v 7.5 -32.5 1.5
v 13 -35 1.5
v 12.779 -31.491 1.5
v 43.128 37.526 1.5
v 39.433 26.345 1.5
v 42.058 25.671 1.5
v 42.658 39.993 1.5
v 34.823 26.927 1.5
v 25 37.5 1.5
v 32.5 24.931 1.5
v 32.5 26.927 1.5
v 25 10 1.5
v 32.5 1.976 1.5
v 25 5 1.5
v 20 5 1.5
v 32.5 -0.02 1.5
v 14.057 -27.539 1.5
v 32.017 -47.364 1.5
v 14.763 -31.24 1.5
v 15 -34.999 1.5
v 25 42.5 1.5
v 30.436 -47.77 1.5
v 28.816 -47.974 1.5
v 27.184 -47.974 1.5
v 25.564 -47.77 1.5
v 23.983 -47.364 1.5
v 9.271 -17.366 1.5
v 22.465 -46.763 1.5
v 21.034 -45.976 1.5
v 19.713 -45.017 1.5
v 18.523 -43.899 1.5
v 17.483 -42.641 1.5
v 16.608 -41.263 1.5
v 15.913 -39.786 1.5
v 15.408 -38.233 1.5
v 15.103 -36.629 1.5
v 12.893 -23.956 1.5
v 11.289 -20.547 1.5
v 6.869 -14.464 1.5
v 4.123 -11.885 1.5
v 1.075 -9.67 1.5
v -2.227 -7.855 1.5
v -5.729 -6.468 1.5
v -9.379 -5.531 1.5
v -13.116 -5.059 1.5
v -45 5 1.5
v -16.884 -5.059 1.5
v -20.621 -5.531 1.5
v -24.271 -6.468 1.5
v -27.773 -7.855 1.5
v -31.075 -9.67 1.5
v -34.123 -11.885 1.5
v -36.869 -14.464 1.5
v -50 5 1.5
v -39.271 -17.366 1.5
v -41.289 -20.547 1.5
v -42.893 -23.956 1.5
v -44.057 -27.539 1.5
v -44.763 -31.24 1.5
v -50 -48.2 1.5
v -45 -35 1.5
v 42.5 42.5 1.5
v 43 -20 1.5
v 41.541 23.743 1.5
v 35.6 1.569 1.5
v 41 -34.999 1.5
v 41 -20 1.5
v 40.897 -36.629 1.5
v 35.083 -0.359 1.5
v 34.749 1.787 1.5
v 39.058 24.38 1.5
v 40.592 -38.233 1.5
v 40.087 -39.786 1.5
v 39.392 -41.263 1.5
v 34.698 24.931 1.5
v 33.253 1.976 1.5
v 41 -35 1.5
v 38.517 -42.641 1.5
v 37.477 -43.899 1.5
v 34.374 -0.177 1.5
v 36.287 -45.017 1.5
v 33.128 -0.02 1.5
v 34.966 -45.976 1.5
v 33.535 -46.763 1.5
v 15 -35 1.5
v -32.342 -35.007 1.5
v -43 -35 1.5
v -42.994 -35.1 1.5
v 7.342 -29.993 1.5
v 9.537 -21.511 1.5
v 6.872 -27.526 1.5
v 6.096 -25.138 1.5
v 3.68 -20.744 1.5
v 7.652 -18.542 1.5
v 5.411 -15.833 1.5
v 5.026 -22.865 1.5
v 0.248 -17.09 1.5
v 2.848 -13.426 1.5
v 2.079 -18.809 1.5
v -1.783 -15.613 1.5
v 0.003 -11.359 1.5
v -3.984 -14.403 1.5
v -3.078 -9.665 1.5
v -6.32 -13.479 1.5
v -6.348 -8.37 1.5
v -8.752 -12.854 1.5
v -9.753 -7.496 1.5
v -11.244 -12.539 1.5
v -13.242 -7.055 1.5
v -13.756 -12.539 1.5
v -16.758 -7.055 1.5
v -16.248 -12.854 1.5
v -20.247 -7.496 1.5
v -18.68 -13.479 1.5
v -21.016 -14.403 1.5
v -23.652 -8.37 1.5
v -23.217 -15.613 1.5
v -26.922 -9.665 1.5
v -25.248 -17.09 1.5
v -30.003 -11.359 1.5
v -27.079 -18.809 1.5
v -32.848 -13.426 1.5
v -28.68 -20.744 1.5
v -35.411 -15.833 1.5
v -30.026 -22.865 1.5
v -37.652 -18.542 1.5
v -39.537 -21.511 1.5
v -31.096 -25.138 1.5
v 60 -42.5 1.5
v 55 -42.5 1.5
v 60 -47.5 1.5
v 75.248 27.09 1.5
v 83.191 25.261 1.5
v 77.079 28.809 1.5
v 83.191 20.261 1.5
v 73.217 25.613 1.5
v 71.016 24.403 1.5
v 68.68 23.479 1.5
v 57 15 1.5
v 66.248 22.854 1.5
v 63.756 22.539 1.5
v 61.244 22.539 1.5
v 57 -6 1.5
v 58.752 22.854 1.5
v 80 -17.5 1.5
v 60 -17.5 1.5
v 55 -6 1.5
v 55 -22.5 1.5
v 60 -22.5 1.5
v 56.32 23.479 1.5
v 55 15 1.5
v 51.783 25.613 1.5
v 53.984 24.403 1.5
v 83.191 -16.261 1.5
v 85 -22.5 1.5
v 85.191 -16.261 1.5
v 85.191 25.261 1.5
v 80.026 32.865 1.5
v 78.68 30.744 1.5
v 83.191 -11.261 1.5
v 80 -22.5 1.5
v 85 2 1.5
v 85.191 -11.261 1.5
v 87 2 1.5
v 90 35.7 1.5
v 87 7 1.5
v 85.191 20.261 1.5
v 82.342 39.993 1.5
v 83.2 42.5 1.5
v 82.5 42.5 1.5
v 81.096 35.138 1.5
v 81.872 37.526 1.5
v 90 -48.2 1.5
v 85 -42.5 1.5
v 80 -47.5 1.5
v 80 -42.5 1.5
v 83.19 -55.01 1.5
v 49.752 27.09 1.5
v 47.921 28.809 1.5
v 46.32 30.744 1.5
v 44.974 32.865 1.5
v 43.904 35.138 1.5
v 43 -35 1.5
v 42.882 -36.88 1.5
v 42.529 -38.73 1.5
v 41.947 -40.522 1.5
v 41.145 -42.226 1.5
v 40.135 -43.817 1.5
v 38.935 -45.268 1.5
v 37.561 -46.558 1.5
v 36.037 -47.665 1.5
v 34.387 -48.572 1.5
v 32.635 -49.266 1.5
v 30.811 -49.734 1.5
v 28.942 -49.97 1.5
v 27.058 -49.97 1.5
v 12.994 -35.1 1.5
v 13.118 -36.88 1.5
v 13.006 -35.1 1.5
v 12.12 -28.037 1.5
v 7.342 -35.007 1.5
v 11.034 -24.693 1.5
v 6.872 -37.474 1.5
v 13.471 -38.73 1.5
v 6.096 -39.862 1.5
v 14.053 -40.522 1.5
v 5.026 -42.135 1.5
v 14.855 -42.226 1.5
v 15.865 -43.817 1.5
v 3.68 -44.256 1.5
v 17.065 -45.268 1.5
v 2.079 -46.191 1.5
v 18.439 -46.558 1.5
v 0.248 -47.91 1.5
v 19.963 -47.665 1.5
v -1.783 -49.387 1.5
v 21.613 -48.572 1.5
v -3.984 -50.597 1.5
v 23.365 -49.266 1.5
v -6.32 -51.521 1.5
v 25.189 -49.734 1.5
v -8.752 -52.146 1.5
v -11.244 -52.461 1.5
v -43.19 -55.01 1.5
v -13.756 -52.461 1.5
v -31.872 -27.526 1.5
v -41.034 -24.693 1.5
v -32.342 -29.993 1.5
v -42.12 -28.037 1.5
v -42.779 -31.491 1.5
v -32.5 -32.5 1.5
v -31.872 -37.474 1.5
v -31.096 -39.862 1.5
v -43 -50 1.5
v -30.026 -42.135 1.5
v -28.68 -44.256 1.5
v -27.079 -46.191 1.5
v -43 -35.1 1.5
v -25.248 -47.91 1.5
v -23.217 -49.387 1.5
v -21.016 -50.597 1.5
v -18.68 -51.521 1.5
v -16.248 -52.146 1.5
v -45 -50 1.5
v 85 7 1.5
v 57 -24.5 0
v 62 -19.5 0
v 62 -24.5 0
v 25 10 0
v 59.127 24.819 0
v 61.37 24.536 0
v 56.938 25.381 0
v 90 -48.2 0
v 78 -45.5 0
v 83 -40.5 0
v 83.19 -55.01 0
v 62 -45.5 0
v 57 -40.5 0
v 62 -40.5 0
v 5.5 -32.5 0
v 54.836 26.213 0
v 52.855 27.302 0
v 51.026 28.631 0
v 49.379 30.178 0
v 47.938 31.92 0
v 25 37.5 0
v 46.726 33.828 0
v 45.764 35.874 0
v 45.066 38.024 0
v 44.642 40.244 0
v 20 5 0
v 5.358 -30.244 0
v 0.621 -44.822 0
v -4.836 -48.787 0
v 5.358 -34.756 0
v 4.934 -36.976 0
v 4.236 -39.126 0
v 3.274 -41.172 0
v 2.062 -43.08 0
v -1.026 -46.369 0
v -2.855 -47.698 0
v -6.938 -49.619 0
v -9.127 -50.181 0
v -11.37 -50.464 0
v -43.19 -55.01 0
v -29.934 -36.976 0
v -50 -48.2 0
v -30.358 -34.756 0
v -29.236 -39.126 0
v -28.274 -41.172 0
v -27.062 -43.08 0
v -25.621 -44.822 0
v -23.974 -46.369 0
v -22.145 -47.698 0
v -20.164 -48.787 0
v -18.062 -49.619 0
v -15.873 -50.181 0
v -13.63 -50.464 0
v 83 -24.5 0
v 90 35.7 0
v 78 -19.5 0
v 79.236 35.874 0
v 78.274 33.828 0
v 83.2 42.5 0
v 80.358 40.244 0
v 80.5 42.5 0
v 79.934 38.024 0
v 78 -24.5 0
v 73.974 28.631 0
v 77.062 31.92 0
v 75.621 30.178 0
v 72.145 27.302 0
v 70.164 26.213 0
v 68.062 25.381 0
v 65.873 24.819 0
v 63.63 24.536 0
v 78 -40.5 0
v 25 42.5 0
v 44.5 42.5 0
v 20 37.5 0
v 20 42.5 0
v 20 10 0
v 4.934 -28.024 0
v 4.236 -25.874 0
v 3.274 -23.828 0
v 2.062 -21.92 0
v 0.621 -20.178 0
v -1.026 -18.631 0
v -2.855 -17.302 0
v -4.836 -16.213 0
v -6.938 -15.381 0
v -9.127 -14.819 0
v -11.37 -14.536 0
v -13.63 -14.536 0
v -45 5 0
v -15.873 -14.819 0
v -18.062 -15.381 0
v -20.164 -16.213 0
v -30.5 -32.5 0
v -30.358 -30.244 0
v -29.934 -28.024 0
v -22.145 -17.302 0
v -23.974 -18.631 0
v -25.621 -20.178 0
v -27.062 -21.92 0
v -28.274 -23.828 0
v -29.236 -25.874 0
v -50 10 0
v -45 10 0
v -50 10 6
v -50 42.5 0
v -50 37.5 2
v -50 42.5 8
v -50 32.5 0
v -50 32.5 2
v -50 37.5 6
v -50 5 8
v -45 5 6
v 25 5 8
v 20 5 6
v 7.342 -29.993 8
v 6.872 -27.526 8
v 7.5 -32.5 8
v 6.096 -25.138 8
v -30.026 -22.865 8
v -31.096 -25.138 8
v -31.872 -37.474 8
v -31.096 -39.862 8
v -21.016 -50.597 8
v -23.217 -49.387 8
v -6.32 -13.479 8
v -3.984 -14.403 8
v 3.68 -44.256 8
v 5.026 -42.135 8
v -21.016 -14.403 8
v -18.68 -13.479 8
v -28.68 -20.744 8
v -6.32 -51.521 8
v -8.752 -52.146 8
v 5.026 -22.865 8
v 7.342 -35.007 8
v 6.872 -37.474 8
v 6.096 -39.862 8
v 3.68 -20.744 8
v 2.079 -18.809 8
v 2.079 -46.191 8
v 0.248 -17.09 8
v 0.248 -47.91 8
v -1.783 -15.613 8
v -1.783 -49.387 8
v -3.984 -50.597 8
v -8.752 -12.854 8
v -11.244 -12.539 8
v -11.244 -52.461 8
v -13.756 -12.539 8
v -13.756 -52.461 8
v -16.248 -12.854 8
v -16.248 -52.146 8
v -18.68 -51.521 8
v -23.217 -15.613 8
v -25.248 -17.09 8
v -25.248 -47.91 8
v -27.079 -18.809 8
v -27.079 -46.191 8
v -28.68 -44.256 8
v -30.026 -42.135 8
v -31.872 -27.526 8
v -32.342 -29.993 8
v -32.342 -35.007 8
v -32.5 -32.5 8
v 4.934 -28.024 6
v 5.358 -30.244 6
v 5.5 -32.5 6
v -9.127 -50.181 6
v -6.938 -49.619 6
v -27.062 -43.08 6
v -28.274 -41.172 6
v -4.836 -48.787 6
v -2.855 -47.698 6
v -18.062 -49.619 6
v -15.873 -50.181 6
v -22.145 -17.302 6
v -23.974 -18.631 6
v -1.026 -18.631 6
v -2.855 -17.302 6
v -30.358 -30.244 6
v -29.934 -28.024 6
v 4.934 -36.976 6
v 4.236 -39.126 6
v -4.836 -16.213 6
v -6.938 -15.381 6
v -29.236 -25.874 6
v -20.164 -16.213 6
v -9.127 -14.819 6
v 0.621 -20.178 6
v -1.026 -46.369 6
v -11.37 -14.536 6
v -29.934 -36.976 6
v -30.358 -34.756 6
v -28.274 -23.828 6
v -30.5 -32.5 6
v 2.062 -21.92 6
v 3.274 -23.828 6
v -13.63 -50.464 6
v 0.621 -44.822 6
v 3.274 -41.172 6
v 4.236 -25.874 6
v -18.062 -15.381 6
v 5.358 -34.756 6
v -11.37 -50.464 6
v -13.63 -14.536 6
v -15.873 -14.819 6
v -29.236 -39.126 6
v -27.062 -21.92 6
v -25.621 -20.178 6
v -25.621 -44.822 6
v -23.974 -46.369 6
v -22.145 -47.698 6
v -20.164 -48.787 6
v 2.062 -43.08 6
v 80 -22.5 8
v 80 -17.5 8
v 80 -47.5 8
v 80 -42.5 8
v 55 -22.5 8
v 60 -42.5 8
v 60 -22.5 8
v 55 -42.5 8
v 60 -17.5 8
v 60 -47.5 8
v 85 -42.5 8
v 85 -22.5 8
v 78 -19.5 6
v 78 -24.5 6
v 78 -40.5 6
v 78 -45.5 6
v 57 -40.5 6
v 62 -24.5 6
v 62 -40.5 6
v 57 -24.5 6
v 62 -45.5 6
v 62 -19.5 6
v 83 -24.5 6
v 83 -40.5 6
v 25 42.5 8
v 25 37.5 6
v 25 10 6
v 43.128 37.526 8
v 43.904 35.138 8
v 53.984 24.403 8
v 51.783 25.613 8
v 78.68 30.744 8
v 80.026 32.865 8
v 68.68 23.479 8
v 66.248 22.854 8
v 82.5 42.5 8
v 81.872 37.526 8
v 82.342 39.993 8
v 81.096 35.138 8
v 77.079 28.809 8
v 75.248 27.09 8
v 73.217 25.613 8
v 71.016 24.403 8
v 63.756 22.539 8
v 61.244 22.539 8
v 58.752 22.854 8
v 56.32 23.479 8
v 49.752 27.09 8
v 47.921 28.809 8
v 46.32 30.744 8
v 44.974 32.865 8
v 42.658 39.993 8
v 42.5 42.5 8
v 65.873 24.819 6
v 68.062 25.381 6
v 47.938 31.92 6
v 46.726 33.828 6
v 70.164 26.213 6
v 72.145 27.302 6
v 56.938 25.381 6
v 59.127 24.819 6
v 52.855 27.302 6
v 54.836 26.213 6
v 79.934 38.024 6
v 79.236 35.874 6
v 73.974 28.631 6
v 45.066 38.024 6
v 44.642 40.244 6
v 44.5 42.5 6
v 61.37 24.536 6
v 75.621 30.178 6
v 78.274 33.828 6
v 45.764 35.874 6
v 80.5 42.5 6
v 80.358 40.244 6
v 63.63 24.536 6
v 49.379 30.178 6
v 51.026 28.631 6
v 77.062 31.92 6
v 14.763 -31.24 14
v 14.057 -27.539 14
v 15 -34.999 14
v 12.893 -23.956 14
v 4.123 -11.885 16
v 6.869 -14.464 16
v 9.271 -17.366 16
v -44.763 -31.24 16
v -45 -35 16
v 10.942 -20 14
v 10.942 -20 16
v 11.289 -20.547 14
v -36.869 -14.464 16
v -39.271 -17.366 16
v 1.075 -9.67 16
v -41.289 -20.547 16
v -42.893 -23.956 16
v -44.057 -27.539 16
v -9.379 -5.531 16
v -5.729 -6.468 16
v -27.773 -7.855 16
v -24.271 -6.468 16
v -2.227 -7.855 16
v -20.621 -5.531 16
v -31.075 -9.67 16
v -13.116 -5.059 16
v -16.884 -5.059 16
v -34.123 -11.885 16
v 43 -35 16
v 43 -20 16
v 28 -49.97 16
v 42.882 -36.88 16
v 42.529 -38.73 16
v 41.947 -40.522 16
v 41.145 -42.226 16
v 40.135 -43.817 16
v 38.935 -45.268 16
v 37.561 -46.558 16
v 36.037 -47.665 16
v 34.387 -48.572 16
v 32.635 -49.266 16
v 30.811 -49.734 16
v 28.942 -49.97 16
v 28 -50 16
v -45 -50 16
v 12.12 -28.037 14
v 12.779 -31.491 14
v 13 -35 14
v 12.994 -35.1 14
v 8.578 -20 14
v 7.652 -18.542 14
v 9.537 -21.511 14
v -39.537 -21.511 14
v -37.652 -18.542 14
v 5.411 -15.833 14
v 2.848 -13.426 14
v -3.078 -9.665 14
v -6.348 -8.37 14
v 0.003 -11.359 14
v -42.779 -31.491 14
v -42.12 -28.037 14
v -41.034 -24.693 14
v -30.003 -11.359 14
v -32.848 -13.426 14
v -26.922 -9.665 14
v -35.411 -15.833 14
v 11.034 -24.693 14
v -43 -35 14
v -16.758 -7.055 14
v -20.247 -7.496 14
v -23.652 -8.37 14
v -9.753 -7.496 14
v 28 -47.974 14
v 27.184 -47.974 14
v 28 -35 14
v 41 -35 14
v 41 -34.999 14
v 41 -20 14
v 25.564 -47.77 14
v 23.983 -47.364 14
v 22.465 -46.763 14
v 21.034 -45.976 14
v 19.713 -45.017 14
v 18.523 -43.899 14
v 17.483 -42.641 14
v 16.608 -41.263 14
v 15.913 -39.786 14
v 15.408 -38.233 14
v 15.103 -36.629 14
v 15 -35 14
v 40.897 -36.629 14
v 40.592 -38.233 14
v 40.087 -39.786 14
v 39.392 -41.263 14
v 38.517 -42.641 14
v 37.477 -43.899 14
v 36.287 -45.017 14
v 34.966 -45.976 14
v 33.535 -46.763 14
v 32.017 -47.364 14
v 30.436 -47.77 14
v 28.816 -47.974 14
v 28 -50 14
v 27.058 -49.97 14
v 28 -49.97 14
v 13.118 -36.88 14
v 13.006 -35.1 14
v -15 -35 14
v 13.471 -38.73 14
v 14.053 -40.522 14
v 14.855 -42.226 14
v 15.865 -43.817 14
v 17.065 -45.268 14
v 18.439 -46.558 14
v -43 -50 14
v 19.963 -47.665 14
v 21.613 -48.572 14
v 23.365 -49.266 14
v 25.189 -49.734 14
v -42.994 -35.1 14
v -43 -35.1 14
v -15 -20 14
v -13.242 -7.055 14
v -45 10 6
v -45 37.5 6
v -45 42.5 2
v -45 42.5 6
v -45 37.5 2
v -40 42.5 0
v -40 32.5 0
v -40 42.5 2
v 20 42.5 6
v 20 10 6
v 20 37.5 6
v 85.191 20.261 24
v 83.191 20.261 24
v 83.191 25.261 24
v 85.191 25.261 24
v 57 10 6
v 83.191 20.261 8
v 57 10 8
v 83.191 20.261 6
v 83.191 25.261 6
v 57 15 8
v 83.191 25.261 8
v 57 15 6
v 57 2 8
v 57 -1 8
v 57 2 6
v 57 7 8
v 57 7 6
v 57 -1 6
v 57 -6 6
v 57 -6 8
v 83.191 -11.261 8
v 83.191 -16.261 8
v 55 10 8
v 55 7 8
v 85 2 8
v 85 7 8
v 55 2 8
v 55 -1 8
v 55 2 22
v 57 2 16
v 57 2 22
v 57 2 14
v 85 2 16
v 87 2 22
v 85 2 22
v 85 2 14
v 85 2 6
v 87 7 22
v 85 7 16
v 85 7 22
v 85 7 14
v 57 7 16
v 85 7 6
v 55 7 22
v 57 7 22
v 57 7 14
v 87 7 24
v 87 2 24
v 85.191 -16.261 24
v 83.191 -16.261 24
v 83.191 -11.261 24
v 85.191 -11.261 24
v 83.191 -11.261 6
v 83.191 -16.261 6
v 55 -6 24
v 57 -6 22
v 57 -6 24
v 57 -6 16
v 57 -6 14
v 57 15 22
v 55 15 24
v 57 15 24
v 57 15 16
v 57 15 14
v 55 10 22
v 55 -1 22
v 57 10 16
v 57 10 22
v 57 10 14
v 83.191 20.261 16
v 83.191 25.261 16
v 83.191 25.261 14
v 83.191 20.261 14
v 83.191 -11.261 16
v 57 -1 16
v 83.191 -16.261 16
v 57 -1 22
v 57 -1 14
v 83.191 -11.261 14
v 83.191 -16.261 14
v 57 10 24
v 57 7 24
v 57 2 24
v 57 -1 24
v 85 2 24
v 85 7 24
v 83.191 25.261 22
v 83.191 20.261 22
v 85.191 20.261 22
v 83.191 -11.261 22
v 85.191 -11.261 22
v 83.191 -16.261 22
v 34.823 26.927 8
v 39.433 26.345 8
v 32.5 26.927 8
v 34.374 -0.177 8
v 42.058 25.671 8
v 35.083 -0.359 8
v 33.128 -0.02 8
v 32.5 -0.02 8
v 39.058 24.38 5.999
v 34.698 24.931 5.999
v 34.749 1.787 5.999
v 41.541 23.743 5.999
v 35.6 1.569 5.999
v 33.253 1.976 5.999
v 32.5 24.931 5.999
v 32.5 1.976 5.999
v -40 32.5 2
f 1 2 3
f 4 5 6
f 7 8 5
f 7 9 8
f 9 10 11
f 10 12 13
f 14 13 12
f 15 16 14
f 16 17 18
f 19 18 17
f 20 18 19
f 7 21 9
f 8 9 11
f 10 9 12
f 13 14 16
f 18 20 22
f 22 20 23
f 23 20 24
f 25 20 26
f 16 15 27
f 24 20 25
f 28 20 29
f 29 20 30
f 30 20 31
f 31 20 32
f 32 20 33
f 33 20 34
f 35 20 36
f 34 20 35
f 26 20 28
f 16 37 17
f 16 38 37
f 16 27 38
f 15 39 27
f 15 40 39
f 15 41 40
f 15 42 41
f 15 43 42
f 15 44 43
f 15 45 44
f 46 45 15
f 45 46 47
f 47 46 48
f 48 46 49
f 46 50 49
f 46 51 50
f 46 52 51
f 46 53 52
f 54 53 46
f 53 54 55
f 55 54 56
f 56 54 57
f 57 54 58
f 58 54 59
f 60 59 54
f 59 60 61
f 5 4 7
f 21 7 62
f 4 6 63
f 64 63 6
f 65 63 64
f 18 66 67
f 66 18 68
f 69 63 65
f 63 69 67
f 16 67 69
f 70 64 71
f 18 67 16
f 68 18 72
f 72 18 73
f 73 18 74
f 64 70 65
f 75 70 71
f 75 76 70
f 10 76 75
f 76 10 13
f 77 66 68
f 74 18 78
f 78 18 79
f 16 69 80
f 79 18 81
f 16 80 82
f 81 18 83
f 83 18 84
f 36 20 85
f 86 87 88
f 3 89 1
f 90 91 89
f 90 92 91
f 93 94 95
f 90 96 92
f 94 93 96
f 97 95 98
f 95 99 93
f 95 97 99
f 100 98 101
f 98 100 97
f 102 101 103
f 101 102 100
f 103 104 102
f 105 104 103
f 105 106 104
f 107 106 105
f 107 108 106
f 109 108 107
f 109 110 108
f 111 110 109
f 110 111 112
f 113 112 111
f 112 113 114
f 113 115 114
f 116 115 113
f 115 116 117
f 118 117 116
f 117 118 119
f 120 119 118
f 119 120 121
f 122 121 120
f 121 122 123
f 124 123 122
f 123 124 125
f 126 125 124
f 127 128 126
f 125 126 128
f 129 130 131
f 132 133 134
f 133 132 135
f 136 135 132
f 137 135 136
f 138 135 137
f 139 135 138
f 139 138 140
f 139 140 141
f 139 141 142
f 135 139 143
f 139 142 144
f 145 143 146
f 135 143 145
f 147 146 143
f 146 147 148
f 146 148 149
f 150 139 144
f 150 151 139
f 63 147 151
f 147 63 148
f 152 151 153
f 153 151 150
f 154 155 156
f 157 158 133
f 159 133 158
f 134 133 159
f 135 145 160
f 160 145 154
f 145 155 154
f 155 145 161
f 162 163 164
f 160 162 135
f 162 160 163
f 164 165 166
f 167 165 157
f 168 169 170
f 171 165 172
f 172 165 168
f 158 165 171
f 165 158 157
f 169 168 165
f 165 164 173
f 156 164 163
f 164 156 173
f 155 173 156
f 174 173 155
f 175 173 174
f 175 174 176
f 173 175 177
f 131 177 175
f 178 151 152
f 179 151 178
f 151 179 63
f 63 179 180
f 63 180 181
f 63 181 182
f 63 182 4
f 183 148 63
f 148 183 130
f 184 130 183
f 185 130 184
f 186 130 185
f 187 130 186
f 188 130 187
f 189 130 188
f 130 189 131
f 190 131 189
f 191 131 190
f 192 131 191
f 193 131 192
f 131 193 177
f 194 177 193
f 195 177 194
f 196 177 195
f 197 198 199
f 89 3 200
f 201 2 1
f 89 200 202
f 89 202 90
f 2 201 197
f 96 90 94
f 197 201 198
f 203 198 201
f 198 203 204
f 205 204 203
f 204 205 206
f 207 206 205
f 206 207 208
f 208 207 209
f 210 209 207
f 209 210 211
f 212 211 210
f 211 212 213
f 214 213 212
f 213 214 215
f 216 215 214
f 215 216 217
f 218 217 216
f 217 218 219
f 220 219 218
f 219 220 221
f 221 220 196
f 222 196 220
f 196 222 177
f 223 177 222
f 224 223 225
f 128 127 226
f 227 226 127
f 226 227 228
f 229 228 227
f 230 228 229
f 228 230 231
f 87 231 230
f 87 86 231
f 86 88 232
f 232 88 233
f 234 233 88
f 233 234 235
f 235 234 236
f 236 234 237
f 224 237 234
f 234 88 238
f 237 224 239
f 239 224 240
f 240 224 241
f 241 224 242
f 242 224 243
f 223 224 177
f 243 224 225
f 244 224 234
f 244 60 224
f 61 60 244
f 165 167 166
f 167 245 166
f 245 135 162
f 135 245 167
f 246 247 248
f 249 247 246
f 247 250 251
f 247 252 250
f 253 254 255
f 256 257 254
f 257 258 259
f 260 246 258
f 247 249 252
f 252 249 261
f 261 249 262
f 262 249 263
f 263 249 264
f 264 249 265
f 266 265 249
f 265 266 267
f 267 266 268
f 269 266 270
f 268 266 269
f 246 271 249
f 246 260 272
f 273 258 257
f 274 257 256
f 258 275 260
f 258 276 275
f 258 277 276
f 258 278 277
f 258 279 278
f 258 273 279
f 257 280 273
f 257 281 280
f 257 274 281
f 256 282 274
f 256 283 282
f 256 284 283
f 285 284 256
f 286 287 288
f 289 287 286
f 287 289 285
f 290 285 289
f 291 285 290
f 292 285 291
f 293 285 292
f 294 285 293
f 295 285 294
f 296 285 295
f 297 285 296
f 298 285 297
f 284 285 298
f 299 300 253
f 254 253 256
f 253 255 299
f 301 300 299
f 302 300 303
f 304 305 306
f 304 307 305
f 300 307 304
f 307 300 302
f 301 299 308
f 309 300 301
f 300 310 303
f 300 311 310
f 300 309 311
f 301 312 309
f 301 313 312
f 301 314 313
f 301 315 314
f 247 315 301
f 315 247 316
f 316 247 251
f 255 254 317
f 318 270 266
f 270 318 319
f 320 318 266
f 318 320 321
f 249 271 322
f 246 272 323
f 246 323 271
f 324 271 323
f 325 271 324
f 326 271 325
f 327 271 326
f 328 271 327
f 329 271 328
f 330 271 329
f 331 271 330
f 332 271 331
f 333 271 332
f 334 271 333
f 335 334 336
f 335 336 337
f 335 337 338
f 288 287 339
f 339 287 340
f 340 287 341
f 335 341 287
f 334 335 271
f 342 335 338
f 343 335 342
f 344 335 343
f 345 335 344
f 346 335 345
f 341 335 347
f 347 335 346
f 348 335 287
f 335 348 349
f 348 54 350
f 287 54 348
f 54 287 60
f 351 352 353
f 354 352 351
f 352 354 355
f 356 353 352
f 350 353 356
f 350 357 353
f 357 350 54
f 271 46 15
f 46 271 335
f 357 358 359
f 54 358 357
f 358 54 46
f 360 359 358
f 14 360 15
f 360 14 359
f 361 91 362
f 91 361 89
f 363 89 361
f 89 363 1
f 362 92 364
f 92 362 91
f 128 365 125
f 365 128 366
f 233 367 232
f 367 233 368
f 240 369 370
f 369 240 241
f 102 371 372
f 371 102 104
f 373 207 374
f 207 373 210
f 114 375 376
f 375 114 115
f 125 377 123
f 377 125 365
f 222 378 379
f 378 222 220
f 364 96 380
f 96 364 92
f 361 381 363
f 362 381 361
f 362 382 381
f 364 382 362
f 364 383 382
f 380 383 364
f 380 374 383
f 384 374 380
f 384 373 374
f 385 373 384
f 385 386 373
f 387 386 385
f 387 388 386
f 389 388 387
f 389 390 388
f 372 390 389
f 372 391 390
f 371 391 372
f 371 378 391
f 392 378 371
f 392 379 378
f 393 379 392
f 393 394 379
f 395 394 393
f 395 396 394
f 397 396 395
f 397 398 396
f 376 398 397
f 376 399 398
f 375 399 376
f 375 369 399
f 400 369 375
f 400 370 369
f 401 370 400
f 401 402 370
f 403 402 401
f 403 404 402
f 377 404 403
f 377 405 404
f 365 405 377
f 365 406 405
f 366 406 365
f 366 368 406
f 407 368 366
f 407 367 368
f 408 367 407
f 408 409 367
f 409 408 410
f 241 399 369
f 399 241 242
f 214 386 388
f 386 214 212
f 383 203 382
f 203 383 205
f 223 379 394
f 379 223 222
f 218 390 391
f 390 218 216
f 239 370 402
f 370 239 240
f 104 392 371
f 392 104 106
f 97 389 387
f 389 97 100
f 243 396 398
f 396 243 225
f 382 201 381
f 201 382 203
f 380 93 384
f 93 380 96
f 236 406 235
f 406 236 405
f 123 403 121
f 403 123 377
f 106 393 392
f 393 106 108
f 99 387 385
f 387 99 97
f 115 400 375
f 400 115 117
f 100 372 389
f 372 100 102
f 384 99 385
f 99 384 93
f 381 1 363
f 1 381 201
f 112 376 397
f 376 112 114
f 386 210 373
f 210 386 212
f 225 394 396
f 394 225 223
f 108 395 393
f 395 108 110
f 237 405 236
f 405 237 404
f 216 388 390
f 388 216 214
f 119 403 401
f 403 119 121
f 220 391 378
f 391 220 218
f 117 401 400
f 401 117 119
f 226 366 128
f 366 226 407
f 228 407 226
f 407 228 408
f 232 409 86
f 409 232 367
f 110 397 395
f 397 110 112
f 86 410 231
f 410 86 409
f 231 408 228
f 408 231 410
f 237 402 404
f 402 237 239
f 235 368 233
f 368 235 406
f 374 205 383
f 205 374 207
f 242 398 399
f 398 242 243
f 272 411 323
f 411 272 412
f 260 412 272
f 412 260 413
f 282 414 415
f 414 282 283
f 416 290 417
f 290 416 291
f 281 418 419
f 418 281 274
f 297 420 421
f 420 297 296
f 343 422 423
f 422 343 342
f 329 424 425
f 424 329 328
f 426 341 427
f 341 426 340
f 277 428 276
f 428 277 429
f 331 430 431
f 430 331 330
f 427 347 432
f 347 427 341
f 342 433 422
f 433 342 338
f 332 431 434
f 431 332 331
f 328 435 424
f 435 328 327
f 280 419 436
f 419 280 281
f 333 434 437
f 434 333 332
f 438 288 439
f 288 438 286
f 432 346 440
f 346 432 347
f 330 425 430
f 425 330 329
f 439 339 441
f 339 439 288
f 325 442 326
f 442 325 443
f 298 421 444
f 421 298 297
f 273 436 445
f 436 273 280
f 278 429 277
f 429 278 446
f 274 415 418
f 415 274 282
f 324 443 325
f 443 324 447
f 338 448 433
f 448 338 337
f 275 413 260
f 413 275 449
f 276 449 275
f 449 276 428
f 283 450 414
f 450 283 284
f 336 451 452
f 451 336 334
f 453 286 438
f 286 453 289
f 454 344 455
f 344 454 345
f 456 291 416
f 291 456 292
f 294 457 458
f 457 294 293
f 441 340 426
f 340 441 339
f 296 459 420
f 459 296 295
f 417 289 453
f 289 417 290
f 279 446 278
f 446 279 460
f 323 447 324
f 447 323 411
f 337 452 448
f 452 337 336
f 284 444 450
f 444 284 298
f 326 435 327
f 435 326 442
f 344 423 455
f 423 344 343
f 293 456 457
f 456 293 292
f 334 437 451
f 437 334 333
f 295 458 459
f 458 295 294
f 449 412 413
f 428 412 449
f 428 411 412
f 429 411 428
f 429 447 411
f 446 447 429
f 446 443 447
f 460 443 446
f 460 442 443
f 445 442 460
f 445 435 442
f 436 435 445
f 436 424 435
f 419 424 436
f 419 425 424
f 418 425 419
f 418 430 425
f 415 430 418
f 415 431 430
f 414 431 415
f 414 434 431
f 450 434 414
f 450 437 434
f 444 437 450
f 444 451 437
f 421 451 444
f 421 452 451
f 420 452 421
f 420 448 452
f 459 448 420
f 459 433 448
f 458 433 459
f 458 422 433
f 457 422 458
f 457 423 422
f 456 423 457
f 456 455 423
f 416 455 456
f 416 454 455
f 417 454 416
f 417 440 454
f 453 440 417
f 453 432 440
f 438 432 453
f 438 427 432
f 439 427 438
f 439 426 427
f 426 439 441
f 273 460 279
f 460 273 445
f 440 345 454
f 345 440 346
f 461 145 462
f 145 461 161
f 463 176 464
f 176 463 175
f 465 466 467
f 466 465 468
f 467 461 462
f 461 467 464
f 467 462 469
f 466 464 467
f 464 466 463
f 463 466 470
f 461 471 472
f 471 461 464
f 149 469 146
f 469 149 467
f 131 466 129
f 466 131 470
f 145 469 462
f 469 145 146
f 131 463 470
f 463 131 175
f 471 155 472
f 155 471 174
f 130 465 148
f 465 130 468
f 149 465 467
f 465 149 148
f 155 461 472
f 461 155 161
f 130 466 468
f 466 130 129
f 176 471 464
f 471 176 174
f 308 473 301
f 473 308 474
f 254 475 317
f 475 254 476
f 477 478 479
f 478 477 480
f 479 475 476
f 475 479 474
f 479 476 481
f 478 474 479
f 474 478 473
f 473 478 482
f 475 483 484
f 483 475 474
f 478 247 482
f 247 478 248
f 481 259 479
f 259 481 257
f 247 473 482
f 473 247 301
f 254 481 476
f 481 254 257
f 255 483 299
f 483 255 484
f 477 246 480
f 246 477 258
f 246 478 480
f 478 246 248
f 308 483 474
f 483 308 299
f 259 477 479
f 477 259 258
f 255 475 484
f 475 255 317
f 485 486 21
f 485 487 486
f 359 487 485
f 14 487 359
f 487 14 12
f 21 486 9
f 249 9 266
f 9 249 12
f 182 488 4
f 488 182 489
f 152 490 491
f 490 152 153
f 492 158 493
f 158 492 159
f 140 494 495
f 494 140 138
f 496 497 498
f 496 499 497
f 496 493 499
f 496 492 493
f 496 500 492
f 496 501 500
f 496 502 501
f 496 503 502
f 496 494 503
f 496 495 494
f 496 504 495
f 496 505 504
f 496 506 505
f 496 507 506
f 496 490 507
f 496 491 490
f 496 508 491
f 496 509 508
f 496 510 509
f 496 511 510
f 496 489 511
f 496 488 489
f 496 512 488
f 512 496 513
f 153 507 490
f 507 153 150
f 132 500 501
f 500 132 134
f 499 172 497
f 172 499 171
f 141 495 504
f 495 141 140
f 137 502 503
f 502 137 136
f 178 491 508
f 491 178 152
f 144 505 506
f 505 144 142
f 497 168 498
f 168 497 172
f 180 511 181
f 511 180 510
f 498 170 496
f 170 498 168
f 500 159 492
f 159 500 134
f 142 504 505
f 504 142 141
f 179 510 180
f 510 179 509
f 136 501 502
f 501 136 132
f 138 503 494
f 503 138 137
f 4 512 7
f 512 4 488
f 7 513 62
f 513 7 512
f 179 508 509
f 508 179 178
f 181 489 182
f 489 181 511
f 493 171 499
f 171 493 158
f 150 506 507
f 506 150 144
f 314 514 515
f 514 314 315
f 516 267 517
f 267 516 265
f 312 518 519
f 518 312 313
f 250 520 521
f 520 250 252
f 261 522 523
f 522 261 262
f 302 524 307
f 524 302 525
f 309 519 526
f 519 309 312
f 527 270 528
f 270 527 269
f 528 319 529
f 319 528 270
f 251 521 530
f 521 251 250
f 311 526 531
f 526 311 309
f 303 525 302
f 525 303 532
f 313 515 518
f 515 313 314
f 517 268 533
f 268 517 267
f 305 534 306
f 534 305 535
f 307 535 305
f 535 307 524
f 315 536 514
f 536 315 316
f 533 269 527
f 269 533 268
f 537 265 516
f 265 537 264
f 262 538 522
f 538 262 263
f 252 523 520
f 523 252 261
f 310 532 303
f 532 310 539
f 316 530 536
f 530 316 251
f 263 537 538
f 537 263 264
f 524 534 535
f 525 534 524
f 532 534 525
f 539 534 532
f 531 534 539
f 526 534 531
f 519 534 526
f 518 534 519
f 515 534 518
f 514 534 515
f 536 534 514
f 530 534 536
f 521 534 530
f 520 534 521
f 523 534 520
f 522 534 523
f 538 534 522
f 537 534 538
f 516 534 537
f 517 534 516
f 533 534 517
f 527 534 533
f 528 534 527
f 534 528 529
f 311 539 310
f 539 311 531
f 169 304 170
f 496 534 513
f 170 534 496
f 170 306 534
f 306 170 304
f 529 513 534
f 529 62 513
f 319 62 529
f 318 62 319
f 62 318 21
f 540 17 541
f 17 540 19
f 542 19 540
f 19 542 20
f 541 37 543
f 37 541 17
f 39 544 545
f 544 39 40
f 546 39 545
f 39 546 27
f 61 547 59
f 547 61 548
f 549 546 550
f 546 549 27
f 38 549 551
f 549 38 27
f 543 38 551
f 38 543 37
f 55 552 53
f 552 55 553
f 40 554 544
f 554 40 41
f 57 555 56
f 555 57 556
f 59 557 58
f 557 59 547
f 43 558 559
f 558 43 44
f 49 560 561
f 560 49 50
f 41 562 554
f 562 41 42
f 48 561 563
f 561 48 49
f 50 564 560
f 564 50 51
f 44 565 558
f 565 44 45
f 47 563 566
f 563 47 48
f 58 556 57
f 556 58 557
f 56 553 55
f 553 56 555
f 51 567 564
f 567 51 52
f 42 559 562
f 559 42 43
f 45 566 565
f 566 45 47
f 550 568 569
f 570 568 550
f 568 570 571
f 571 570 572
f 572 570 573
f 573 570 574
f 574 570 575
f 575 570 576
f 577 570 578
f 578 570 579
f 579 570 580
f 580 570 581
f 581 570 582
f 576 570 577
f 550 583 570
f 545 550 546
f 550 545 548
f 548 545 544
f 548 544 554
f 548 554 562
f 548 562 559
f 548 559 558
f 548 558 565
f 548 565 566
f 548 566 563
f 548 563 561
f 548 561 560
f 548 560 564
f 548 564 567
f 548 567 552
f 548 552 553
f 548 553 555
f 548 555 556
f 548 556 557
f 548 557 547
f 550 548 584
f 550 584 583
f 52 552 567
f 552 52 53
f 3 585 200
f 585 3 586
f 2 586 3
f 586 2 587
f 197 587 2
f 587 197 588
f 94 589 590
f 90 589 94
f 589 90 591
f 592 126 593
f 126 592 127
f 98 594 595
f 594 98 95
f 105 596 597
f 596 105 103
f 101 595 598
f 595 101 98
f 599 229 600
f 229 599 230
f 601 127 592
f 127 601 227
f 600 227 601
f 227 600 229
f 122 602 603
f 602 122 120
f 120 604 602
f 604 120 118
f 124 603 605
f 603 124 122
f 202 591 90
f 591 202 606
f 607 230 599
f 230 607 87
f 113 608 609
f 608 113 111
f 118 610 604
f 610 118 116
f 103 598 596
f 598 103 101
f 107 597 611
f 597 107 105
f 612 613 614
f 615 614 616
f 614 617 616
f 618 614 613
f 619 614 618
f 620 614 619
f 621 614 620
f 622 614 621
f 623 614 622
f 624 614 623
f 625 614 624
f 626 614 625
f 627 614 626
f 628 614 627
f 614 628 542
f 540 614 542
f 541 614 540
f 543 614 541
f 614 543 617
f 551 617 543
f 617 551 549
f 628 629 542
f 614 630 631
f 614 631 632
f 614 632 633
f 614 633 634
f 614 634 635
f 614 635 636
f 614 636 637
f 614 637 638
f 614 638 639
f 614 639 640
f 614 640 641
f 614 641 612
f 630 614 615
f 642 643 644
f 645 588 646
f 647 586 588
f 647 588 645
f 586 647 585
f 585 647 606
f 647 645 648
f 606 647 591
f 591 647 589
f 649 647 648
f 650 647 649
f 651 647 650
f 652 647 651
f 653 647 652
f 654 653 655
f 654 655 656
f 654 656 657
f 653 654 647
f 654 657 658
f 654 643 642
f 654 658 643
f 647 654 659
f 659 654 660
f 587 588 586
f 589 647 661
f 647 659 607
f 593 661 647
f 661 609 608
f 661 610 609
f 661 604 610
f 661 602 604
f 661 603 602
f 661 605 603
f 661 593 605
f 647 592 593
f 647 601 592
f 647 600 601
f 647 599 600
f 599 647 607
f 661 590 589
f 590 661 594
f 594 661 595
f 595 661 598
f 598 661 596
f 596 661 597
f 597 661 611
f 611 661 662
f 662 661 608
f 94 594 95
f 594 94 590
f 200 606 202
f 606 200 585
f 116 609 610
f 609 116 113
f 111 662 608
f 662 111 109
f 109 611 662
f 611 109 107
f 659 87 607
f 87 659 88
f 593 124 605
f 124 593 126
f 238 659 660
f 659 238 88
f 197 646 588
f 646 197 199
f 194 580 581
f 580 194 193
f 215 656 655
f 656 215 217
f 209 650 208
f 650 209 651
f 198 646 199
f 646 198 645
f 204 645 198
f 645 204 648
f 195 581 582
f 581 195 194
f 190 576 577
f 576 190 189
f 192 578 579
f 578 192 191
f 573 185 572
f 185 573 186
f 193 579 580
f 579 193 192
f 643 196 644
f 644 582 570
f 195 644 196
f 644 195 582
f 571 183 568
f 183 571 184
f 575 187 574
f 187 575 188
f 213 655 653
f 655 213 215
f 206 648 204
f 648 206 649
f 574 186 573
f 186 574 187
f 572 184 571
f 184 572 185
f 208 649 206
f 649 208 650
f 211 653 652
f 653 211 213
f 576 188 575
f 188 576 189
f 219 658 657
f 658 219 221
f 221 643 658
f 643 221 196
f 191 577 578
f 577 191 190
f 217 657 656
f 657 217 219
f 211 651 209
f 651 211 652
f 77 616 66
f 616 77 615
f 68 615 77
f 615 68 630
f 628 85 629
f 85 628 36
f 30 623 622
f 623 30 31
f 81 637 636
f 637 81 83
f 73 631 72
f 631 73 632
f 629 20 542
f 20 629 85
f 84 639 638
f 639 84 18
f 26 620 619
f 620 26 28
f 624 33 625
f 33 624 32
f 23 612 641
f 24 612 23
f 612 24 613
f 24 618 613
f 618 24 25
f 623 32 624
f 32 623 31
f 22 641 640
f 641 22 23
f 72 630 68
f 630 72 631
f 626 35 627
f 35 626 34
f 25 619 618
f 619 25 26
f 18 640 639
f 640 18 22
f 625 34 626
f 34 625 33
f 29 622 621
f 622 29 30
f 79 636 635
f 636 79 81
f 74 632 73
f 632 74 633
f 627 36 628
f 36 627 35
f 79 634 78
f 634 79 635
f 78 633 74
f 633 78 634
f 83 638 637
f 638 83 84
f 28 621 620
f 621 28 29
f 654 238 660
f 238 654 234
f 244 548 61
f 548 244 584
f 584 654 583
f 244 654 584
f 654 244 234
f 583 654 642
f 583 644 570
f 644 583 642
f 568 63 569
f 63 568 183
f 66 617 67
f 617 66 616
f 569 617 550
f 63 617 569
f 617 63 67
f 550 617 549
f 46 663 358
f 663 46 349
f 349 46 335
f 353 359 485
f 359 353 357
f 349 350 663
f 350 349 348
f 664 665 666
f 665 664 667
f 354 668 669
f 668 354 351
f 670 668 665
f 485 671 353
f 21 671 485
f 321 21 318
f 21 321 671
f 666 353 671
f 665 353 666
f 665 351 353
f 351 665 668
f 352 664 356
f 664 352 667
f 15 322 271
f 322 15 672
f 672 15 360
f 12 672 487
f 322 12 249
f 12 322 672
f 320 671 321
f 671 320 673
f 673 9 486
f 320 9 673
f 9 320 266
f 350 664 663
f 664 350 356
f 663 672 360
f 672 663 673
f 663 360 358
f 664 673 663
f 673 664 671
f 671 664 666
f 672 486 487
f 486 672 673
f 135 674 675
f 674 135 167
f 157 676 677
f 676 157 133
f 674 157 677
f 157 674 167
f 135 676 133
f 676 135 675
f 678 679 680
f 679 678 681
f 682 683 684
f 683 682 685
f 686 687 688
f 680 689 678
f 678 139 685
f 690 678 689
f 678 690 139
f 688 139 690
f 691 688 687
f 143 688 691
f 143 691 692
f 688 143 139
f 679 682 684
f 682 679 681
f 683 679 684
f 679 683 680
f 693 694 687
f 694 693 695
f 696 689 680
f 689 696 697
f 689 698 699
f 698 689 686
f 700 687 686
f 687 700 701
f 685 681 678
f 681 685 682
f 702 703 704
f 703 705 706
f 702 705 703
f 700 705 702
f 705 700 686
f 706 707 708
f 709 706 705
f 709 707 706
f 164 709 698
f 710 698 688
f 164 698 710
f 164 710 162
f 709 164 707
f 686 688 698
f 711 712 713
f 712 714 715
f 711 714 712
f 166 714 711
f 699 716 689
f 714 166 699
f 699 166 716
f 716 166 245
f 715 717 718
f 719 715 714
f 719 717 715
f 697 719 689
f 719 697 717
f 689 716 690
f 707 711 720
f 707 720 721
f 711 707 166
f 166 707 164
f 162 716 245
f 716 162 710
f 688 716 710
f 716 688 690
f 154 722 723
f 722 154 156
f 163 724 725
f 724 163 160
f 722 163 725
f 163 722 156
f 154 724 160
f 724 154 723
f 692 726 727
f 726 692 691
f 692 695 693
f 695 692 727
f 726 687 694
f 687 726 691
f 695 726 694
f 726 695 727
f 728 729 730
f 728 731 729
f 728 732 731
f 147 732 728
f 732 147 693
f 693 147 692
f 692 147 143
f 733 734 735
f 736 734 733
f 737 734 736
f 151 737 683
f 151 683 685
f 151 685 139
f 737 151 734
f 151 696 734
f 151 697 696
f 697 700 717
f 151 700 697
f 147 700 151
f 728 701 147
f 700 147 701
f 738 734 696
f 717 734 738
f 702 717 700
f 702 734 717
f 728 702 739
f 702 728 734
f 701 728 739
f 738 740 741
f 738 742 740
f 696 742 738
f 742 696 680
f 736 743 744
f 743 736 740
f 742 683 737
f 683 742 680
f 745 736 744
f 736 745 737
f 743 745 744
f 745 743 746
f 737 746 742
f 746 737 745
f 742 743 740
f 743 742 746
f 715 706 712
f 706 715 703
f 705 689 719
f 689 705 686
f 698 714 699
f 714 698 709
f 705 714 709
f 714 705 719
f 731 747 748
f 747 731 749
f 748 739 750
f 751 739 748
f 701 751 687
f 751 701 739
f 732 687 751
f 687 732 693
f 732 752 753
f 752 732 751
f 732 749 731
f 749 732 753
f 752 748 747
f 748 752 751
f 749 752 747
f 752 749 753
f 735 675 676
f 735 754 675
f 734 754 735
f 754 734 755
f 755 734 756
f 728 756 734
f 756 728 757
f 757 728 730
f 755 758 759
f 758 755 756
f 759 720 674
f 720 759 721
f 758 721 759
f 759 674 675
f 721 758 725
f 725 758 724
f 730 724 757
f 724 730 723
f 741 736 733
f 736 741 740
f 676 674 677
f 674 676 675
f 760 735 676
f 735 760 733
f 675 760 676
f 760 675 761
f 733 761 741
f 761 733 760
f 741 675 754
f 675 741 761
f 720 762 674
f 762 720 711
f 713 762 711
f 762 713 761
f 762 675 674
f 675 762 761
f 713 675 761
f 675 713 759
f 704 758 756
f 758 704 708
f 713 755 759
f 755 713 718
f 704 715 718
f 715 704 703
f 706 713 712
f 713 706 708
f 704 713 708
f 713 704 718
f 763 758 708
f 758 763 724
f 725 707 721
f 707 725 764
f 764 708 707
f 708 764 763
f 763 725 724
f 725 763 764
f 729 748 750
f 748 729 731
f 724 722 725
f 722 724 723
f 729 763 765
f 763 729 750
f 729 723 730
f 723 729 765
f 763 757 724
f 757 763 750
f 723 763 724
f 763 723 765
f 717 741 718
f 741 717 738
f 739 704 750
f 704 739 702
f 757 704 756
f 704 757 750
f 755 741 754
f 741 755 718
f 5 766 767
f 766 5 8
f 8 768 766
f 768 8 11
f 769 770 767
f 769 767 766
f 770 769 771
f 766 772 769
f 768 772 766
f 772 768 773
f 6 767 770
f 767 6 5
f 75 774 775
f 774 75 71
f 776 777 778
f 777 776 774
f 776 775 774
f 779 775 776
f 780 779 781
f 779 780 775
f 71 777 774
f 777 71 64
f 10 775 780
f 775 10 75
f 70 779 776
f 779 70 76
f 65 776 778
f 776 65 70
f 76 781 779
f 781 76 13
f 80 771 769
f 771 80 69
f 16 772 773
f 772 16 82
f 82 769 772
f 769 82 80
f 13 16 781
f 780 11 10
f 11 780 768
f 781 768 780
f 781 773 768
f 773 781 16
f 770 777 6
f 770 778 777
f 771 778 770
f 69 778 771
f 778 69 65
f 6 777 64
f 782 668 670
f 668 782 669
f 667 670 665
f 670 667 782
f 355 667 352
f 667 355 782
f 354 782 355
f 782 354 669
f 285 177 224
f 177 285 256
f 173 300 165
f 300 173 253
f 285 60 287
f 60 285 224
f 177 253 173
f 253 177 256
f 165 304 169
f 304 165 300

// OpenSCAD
//BRIDGESSSS
//enclosed convex
//enclosed concave
//single anchor (C)
//S anchor
//chair
//one-to-one
//one-to-many
//many-to-many

//make wedge wider
//convex/concave bridges... 

thickness = 2;
height = 8;				//this includes the base height
baseHeight = 1.5;
outset = 15;

angles = [-20, 0, 20];	//order least to greatest...

d1 = 20;
d2 = 30;
width = 5;
spacing = 3;

$fn = 50;

baseLength = 2*max(d1,d2) + outset;

module addBase()
{
	union(){
		translate([0,0,.5*baseHeight]) cube([baseLength, baseLength, baseHeight], center=true);
		child();
	}
}


module enclosedConvex(radius)
{
	difference(){
		addBase() cylinder(height, radius, radius, 0);
		translate([0,0,-thickness]) cylinder(height, radius-thickness, radius-thickness, 0);
	}
}

module enclosedConcave(width, depth)
{
	difference(){
		addBase()
		translate([.5*outset, 0,0])
		union(){
			translate([0,0, .5*height]) cube([width, depth, height], center=true);
			translate([0,0, .5*height]) cube([depth, width, height], center=true);
		}
		translate([.5*outset, 0,0])
		union(){
			translate([0,0,-thickness+.5*height]) cube([width-2*thickness, depth-2*thickness, height], center=true);
			translate([0,0,-thickness+.5*height]) cube([depth-2*thickness, width-2*thickness, height], center=true);
		}
	}
}

module singleAnchor(radius)
{
	difference(){
		addBase() cylinder(height, radius, radius, 0);
		translate([0,0,-thickness]) cylinder(height, radius-thickness, radius-thickness, 0);
		translate([-2*(radius+outset), 0, -radius]) cube(4*(radius+outset));
	}
}

module SAnchor(r1, r2)
{
	assign(height = 2*height)
	translate([r1,0,0])
	union(){
		difference(){
			cylinder(height, r1, r1, 0);
			translate([0,0,-thickness])  cylinder(height, r1-thickness, r1-thickness, 0);
			translate([-50, -2*50-.1, -50]) cube(100);
		}

		translate([r1+r2-thickness, 0, 0]) 
		difference(){
			cylinder(height, r2, r2, 0);
			translate([0,0,-thickness]) cylinder(height, r2-thickness, r2-thickness, 0);
			translate([-50, .001, -50]) cube(100);
		}

		translate([-r1,-r2,0]) cube([thickness, r2, height]);
		translate([-r1,-r2,height-thickness]) cube([2*r1+r2-thickness, r2, thickness]);
		translate([r1+2*(r2-thickness),0,0]) cube([thickness,.5*r1,height]);
		translate([0,0,height-thickness]) cube([r1+2*r2-thickness, .5*r1, thickness]);
	}
}

module chair(width, depth, legThickness)
{
	//addBase(width, depth, false)
	union(){
		cube([legThickness, legThickness, height]);
		translate([0, depth-legThickness, 0]) cube([legThickness, legThickness, height]);
		translate([width-legThickness, 0, 0]) cube([legThickness, legThickness, height]);
		translate([width-legThickness, depth-legThickness, 0]) cube([legThickness, legThickness, height]);
		translate([0,0,height-thickness]) cube([width, depth, thickness]);
	}
}

module oneToOne(length, width, spacing)
{	union(){
		rotate([0,0,-90]){
			assign(spacing=width+spacing)
			for (i=[0:len(angles)-1])
			{
				translate([i*spacing+width,0,0]) cube([width, thickness, height]);
				translate([i*spacing+width+length*sin(angles[i]),length*cos(angles[i]), 0]) 
					cube([width, thickness, height]);
				translate([0,0,height-thickness])
				linear_extrude(height=thickness)
				polygon([	[i*spacing+width,thickness],
							[i*spacing+2*width,thickness],
							[i*spacing+2*width+length*sin(angles[i]),length*cos(angles[i])],
							[i*spacing+width+length*sin(angles[i]),length*cos(angles[i])]
						]);
			}
		}
	}
}

module oneToMany(length, width, spacing)
{
	union(){
		rotate([0,0,-90]){
			translate([width,0,0]) cube([width*len(angles)+spacing*(len(angles)-1), thickness, height]);
		
			assign(spacing=width+spacing)	
			for (i=[0:len(angles)-1])
			{
				translate([i*spacing+width+length*sin(angles[i]),length*cos(angles[i]), 0]) 
					cube([width, thickness, height]);
				translate([0,0,height-thickness])
				linear_extrude(height=thickness)
				polygon([	[i*spacing+width,thickness],
							[i*spacing+2*width,thickness],
							[i*spacing+2*width+length*sin(angles[i]),length*cos(angles[i])],
							[i*spacing+width+length*sin(angles[i]),length*cos(angles[i])]
						]);
			}
		}
	}
}

module manyToMany(length, width, spacing)
{	
	union(){
		rotate([0,0,-90]){
			translate([width,0,height-thickness]) cube([width*len(angles)+spacing*(len(angles)-1), thickness, thickness]);
	
			assign(spacing=width+spacing)
			for (i=[0:len(angles)-1])
			{
				translate([i*spacing+width,0,0]) cube([width, thickness, height]);
				translate([i*spacing+width+length*sin(angles[i]),length*cos(angles[i]), 0]) 
					cube([width, thickness, height]);
				translate([0,0,height-thickness])
				linear_extrude(height=thickness)
				polygon([	[i*spacing+width,thickness],
							[i*spacing+2*width,thickness],
							[i*spacing+2*width+length*sin(angles[i]),length*cos(angles[i])],
							[i*spacing+width+length*sin(angles[i]),length*cos(angles[i])]
						]);

				if(i<len(angles)){
					translate([0,0,height-thickness])
					linear_extrude(height=thickness)
					polygon([	[i*spacing+2*width+length*sin(angles[i]),length*cos(angles[i])],
								[i*spacing+2*width+length*sin(angles[i]),length*cos(angles[i])+thickness],
								[(i+1)*spacing+width+length*sin(angles[i+1]),length*cos(angles[i+1])+thickness],
								[(i+1)*spacing+width+length*sin(angles[i+1]),length*cos(angles[i+1])]
							]);
				}
			}
		}
	}
}

module wedge(r1,r2, angle)
{
	difference(){
		union(){
			difference(){
				cylinder(height, r1,r1, 0);
				translate([0,0,-.001]) cylinder(height-thickness, r1-thickness, r1-thickness, 0);
			}
			cylinder(height, r2+thickness, r2+thickness, 0);
		}
		cylinder(2*height, r2,r2, 0, center=true);
		translate([-2*r1,0,0]) cube(4*r1, center=true);
		rotate([0,0,-angle]) translate([2*r1,0,0]) cube(4*r1, center=true);
	}
}

translate([-50,-70,0])
difference(){
	union(){
		translate([.5*baseLength,.5*baseLength,0]) enclosedConvex(d1);
		translate([1.5*baseLength,.5*baseLength,0]) enclosedConcave(d1,d2);
		translate([1.5*baseLength, 1.5*baseLength,0]) singleAnchor(d1);
		translate([d1+outset-d2,d1+outset,0]) SAnchor(d2,.75*d1);
		translate([0, baseLength,0]) chair(baseLength,.5*baseLength, width);
		translate([0, baseLength+.5*baseLength-10, 0]) cube([10,10,thickness]);
		translate([baseLength+2*outset,baseLength+outset,0]) oneToMany(d2, width, spacing);
		translate([baseLength+2*outset,baseLength+outset,height]) oneToOne(d2, width, spacing);
		translate([baseLength+2*outset,baseLength+outset,2*height]) manyToMany(d2, width, spacing);
		translate([baseLength+.5*outset,baseLength-outset,0]) wedge(d2+7,10,15);
	}
	//change these eventually
	translate([-baseLength,-.01,-50]) cube([4*baseLength, outset, 100]);
	translate([2*baseLength-10,0,-50]) cube([2*outset,3*baseLength, 100]);

	//cut some corners for less warping (hopefully)
	translate([-.1, outset-.1, -baseHeight])
	linear_extrude(height=3*baseHeight) polygon([[0,0], [0,7], [7,0]]);

	translate([2*baseLength-10+.1, outset-.1, -baseHeight])
	rotate([0,0,90])
	linear_extrude(height=3*baseHeight) polygon([[0,0], [0,7], [7,0]]);
	
	translate([2*baseLength-10+.1, 1.5*baseLength+.1, -baseHeight])
	rotate([0,0,180])
	linear_extrude(height=3*baseHeight) polygon([[0,0], [0,7], [7,0]]);
}
